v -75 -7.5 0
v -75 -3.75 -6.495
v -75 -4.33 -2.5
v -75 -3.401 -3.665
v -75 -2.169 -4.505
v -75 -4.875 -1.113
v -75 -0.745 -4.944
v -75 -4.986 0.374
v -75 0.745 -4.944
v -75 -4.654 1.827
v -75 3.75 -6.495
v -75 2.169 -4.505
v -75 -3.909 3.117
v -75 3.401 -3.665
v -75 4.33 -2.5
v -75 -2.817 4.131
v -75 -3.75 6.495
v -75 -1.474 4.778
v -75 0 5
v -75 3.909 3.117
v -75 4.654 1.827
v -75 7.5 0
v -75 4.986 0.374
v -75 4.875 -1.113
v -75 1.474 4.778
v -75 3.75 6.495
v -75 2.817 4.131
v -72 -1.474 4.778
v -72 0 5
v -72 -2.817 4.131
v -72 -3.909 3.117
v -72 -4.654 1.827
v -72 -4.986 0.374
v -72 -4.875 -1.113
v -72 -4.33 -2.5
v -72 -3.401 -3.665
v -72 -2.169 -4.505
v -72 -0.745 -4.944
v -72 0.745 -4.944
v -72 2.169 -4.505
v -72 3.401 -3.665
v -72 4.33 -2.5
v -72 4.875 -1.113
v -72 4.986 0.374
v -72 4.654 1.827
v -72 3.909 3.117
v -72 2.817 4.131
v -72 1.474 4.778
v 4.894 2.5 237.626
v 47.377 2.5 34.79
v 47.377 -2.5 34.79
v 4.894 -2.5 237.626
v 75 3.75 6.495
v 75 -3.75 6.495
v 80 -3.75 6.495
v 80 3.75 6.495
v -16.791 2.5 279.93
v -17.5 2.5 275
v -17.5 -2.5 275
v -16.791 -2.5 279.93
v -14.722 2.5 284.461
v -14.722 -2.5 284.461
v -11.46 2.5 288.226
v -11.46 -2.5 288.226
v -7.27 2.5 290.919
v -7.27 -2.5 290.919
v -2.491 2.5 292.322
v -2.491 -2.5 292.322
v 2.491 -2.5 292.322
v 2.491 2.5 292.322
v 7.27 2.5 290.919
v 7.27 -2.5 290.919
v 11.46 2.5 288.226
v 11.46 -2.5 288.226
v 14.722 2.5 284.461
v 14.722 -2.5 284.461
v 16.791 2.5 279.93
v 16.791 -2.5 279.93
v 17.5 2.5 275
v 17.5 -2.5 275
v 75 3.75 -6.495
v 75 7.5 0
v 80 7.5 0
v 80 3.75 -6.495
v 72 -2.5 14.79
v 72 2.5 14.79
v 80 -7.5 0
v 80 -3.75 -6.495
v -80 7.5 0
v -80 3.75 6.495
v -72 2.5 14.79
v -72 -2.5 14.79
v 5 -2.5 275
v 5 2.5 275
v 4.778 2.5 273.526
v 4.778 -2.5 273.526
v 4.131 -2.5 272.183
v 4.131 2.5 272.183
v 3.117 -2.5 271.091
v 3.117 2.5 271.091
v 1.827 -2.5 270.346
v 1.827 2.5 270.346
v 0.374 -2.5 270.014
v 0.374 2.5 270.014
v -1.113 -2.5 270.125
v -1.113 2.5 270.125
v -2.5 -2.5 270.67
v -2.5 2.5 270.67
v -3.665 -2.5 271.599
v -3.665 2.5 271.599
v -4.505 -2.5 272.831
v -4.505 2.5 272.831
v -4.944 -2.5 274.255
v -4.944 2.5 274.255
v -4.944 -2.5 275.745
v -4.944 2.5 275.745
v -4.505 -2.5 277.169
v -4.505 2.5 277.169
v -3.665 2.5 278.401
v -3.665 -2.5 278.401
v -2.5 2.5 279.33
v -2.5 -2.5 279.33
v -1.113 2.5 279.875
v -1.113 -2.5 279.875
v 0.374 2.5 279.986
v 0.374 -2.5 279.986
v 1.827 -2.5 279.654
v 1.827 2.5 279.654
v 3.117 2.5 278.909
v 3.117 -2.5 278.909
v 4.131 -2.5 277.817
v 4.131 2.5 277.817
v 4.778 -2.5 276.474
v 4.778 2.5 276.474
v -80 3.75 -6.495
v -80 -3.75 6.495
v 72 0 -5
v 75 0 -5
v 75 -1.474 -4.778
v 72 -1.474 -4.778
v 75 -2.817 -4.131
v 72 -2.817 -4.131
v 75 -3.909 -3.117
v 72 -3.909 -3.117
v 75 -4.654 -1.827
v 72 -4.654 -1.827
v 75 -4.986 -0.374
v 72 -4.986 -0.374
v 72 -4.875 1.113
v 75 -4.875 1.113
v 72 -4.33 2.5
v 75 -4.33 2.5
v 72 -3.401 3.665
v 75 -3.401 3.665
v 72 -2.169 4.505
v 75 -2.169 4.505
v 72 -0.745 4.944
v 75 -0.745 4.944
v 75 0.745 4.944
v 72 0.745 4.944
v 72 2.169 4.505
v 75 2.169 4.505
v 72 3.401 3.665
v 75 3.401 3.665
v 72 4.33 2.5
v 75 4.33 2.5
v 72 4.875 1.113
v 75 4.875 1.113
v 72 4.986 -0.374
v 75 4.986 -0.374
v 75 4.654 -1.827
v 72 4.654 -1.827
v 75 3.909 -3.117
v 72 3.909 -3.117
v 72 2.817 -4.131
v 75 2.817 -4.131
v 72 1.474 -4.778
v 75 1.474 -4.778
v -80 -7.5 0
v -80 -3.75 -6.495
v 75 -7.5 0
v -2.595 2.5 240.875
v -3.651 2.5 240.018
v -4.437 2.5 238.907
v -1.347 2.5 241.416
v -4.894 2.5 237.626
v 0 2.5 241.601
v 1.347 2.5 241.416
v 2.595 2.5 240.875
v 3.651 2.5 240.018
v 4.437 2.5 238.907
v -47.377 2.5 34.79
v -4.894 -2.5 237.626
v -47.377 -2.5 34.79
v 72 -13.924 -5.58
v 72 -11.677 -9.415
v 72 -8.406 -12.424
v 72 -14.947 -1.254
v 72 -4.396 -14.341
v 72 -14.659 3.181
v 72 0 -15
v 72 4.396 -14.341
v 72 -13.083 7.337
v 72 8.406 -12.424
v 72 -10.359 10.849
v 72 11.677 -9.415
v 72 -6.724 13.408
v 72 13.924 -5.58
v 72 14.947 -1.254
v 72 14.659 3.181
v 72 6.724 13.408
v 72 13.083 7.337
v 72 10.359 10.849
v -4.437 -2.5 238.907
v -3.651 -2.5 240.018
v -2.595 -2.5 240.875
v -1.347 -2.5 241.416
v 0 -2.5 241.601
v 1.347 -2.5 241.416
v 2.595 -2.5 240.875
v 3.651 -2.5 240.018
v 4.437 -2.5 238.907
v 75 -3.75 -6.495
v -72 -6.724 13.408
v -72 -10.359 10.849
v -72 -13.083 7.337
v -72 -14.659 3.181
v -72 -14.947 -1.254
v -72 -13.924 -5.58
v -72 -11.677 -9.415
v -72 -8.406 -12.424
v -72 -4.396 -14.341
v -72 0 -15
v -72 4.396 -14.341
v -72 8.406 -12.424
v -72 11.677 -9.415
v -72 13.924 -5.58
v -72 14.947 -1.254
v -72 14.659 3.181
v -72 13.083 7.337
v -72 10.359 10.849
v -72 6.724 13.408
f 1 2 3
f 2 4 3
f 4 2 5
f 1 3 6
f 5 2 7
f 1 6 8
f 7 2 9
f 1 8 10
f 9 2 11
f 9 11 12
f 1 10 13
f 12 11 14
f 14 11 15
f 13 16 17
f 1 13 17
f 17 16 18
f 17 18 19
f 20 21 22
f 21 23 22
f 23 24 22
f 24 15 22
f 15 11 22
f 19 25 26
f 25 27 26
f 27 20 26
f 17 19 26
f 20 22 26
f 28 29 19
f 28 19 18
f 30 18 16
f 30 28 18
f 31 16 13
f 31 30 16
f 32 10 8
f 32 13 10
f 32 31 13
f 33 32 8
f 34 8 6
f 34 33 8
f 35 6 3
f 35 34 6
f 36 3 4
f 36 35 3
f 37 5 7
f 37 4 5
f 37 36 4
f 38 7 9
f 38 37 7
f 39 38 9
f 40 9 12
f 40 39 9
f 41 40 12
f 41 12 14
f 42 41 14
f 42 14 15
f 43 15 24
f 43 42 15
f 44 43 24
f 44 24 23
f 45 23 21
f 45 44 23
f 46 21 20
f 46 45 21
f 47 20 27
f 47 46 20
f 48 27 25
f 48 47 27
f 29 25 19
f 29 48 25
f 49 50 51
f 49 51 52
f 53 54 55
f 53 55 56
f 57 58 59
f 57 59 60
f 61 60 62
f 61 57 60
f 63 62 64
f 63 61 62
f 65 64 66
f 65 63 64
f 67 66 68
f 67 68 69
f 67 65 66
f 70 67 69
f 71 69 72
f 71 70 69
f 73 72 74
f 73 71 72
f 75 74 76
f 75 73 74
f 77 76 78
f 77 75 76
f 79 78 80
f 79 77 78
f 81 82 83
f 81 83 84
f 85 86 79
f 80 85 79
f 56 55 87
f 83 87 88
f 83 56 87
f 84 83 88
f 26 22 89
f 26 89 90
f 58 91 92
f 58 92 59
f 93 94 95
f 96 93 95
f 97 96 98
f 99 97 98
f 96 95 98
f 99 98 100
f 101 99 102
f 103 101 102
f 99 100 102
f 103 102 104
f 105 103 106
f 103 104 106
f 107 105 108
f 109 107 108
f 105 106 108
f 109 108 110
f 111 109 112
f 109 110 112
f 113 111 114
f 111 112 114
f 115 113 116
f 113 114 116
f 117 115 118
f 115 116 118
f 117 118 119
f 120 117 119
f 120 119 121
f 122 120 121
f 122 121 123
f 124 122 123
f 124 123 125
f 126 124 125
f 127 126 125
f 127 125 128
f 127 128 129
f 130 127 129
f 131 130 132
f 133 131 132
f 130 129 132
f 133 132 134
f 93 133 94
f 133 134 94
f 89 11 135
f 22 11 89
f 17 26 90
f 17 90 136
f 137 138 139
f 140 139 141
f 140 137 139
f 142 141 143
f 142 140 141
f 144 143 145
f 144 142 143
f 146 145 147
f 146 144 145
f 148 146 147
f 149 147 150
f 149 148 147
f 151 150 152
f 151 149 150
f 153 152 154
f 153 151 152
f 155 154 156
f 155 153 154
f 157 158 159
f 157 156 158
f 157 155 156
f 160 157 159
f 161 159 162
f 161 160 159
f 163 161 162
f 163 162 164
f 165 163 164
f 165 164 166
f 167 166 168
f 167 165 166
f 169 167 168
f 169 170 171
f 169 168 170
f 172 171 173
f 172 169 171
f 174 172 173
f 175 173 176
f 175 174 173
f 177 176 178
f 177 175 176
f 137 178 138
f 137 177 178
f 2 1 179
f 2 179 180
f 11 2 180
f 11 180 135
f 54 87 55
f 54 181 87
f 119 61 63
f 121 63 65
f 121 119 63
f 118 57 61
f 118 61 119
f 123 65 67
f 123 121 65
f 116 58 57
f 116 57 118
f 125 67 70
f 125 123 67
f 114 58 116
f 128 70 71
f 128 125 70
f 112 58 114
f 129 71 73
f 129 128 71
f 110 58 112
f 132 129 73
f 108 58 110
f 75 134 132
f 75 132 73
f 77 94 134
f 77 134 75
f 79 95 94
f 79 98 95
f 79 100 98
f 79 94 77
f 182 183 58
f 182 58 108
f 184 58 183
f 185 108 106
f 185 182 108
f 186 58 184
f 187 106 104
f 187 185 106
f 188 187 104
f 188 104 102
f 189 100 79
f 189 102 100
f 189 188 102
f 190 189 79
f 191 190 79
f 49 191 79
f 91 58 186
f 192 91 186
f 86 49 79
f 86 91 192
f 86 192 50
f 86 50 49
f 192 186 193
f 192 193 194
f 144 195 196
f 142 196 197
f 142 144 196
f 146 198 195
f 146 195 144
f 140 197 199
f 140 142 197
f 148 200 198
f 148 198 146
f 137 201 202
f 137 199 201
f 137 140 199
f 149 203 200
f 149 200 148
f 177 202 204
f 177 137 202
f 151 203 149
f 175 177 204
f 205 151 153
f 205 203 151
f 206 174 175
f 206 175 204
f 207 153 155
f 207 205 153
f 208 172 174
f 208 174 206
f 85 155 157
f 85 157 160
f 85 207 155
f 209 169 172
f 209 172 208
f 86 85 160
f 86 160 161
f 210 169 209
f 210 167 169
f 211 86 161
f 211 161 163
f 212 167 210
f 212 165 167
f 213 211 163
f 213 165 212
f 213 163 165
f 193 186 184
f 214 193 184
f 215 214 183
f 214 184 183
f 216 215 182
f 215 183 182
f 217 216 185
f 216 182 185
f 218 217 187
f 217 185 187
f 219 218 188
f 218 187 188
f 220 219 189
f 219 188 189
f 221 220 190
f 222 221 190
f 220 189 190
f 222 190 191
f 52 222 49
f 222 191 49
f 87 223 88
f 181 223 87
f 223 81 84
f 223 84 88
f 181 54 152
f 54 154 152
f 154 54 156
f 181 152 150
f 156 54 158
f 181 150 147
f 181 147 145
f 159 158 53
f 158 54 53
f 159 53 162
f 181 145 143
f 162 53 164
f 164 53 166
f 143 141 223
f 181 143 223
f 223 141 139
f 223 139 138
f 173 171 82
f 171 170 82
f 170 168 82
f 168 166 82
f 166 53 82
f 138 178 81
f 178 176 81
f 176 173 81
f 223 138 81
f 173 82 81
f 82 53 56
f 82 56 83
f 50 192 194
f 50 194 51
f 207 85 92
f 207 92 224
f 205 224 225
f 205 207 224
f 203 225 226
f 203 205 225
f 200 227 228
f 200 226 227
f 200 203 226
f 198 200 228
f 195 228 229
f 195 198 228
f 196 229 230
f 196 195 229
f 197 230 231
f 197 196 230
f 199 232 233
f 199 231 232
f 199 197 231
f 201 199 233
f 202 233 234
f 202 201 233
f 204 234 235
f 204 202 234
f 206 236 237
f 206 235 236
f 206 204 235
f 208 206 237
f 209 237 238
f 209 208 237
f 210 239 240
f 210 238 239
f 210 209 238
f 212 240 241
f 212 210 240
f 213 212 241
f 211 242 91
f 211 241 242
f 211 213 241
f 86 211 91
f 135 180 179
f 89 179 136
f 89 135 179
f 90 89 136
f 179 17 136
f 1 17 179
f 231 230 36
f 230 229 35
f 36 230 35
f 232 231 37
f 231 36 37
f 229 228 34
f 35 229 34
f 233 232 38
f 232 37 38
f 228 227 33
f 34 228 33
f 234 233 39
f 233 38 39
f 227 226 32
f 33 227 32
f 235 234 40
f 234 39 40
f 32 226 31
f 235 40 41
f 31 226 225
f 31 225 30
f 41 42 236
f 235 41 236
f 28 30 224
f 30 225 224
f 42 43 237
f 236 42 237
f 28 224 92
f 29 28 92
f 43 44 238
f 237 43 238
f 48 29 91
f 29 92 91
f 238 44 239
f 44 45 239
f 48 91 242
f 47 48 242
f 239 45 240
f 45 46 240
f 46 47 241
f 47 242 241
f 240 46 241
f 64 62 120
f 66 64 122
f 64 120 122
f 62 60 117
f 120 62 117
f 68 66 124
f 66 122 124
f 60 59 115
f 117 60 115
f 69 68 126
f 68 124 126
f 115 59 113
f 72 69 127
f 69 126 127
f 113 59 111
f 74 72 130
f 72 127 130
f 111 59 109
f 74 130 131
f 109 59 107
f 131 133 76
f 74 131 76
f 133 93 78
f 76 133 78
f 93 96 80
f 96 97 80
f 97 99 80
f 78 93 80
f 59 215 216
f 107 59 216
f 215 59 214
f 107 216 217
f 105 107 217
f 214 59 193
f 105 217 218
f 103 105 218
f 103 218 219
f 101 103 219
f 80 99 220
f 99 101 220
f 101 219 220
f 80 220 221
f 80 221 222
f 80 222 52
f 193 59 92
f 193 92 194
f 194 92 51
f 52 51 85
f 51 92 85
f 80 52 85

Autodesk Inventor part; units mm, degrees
ref_plane "YZ Plane" through (0, 0, 0) normal (1, 0, 0) x (0, 1, 0)
ref_plane "XZ Plane" through (0, 0, 0) normal (0, 1, 0) x (-1, 0, 0)
ref_plane "XY Plane" through (0, 0, 0) normal (0, 0, 1) x (1, 0, 0)
sketch "스케치1" plane through (0, 0, 0) normal (1, 0, 0) x (0, 1, 0)
  circle A0 centre (0, 0) radius 15
  dimension "d0" = 30
extrude "돌출1" add sketch "스케치1" along normal mid plane 144
sketch "스케치2" plane through (72, 0, 0) normal (1, 0, 0) x (0, 0, -1)
  circle A0 centre (0, 0) radius 5
  dimension "d3" = 10
sketch "스케치3" plane through (-72, 0, 0) normal (-1, 0, 0) x (0, 0, 1)
  circle A0 centre (0, 0) radius 5
  dimension "d4" = 10
extrude "돌출2" add sketch "스케치3" along normal blind 3
extrude "돌출3" add sketch "스케치2" along normal blind 3
sketch "스케치4" plane through (75, 0, 0) normal (1, 0, 0) x (0, 0, -1)
  line L0 (0, 7.5) -> (6.4952, 3.75)
  line L1 (6.4952, 3.75) -> (6.4952, -3.75)
  line L2 (6.4952, -3.75) -> (0, -7.5)
  line L3 (0, -7.5) -> (-6.4952, -3.75)
  line L4 (-6.4952, -3.75) -> (-6.4952, 3.75)
  line L5 (-6.4952, 3.75) -> (0, 7.5)
  point P0 (0, 0)
  point P1 (0, 0)
  dimension "d9" = 15
extrude "돌출4" add sketch "스케치4" along normal blind 5
sketch "스케치5" plane through (-75, 0, 0) normal (-1, 0, 0) x (0, 0, 1)
  circle A0 centre (0, 0) radius 5 projected
  line L0 (0, 7.5) -> (6.4952, 3.75)
  line L1 (6.4952, 3.75) -> (6.4952, -3.75)
  line L2 (6.4952, -3.75) -> (0, -7.5)
  line L3 (0, -7.5) -> (-6.4952, -3.75)
  line L4 (-6.4952, -3.75) -> (-6.4952, 3.75)
  line L5 (-6.4952, 3.75) -> (0, 7.5)
  dimension "d12" = 15
extrude "돌출5" add sketch "스케치5" along normal blind 5 contours A0 | L0 L1 L2 L3 L4 L5
sketch "스케치11" plane through (0, 0, 0) normal (0, 1, 0) x (-1, 0, 0)
  line L0 (72, 5) -> (72, -5) projected
  line L1 (72, 0) -> (72, 275)
  line L2 (-72, 15) -> (-72, -15) projected
  line L3 (72, 275) -> (-72, 275)
  line L4 (-72, 275) -> (-72, 0)
  line L5 (72, 0) -> (-72, 0)
  line L6 (-75, 6.4952) -> (-75, 0) projected
  point P0 (0, 0)
  dimension "d32" = 275
extrude "돌출12" add sketch "스케치11" along normal mid plane 5
sketch "스케치12" plane through (0, 2.5, 0) normal (0, 1, 0) x (1, 0, 0)
  line L0 (-72, -14.7902) -> (72, -14.7902) projected
  line L1 (-72, -14.7902) -> (-17.5, -275)
  line L2 (-72, -275) -> (72, -275) projected
  line L3 (0, -275) -> (0, -66.6038)
  line L4 (72, -14.7902) -> (17.5, -275)
  line L5 (-72, -14.7902) -> (-72, -275) projected
  line L6 (72, -275) -> (72, -14.7902) projected
  point P0 (0, 0)
  dimension "d37" = 35
extrude "돌출13" cut sketch "스케치12" against normal blind 5 contours L1 L2 L5 | L6 L2 L4
sketch "스케치13" plane through (0, 2.5, 0) normal (0, 1, 0) x (1, 0, 0)
  line L0 (-17.5, -275) -> (17.5, -275) projected
  circle A0 centre (0, -275) radius 17.5
  point P0 (0, 0)
extrude "돌출14" add sketch "스케치13" against normal blind 5 contours L0 A0 picked at (2.0685, -280.4543)
sketch "스케치14" plane through (0, 2.5, 0) normal (0, 1, 0) x (1, 0, 0)
  arc A0 (-17.5, -275) -> (17.5, -275) centre (0, -275) ccw projected
  circle A1 centre (0, -275) radius 5
  line L0 (-72, -14.7902) -> (-17.5, -275) projected
  line L1 (17.5, -275) -> (72, -14.7902) projected
  line L2 (-72, -14.7902) -> (72, -14.7902) projected
  line L3 (-72, -14.7902) -> (-17.5, -275) projected
  arc A2 (-17.5, -275) -> (17.5, -275) centre (0, -275) ccw projected
  line L4 (47.3771, -34.7902) -> (4.8938, -237.6263)
  line L5 (-4.8938, -237.6263) -> (-47.3771, -34.7902)
  line L6 (-47.3771, -34.7902) -> (47.3771, -34.7902)
  arc A3 (-4.8938, -237.6263) -> (4.8938, -237.6263) centre (0, -236.6013) ccw
  point P0 (0, 0)
  dimension "d40" = 10
  dimension "d41" = 20
  dimension "d42" = 5
extrude "돌출15" cut sketch "스케치14" against normal blind 5 contours A1 | L4 A3 L5 L6
properties part number "link"
